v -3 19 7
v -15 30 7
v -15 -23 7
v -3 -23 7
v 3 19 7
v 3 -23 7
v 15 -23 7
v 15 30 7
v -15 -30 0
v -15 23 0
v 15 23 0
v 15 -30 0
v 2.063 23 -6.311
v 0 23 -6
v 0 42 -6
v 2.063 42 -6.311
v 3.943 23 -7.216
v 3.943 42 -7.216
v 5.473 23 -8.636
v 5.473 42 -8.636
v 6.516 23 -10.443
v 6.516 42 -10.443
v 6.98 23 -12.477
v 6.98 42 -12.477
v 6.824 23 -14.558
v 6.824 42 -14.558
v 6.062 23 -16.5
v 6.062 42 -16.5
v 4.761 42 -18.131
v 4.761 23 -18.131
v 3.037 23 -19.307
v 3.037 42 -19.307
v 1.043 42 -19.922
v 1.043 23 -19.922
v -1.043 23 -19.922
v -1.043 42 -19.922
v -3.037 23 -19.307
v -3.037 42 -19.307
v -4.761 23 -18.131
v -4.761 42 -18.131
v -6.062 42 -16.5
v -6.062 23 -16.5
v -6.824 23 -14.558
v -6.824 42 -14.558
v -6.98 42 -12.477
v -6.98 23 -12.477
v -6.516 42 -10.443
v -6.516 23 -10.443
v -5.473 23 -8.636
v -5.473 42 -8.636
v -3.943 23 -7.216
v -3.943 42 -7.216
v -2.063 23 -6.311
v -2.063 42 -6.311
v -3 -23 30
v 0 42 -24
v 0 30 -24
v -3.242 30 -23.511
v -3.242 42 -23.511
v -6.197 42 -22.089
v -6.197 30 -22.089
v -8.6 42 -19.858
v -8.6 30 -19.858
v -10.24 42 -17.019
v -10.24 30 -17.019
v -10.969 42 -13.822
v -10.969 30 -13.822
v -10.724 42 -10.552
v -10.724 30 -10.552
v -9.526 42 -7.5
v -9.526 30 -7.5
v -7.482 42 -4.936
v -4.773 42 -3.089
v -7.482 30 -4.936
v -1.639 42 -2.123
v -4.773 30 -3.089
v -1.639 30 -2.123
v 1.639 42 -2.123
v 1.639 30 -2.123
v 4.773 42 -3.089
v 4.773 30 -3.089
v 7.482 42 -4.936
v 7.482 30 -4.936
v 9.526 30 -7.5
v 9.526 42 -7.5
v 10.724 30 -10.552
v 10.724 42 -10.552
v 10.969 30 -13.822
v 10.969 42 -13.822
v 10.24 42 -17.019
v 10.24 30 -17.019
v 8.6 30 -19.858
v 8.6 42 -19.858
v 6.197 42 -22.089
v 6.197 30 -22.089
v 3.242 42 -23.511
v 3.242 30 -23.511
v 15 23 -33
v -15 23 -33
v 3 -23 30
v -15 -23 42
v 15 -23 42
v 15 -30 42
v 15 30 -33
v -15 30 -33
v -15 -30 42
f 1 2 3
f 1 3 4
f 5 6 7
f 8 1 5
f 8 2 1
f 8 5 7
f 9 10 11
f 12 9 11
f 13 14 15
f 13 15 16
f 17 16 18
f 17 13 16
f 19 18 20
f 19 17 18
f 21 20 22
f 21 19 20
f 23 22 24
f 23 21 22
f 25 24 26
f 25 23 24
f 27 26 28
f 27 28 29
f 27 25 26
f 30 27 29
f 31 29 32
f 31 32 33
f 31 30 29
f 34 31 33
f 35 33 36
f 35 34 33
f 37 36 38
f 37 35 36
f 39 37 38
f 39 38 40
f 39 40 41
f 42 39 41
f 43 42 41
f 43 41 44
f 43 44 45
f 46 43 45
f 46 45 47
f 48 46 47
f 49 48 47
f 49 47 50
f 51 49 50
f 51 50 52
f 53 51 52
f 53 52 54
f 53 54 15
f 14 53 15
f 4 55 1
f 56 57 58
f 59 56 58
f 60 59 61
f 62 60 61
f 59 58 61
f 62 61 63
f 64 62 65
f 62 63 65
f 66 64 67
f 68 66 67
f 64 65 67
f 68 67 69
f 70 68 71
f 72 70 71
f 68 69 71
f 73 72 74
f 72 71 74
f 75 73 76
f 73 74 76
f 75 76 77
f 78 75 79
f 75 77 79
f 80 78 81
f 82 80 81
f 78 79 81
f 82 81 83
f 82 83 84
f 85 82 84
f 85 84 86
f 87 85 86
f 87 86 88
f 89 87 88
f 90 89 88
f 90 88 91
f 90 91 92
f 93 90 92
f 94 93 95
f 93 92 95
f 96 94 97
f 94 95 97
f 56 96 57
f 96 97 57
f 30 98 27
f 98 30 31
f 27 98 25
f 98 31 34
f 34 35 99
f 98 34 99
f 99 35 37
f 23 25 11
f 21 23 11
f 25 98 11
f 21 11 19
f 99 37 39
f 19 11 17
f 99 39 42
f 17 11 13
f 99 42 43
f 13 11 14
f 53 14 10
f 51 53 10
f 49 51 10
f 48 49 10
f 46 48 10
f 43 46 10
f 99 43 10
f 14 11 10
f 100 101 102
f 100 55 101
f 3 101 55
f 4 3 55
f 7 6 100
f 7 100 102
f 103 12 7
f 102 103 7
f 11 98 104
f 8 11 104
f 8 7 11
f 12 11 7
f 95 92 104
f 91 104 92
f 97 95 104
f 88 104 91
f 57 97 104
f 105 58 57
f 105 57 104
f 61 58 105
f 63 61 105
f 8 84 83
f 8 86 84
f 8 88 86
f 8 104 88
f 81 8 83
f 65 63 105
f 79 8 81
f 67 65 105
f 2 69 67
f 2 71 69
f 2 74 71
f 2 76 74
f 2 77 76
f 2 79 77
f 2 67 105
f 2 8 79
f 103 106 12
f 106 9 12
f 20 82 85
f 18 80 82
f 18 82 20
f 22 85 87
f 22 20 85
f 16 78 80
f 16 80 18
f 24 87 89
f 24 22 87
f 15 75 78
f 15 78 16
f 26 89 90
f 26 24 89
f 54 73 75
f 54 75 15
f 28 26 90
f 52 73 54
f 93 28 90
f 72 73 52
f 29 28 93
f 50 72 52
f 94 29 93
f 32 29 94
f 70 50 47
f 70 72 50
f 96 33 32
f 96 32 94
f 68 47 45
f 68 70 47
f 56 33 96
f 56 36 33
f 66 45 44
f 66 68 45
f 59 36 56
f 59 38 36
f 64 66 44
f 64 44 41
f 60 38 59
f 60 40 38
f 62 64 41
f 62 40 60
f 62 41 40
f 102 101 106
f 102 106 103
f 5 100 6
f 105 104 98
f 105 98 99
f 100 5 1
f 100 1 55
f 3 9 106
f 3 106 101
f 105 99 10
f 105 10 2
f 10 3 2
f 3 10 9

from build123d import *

# Parameters (mm, degrees)
SKETCH1_W           = 30
SKETCH1_H           = 60
BOSS_EXTRUDE1_DEPTH = 7
SKETCH2_W           = 30
SKETCH2_H           = 7
BOSS_EXTRUDE2_DEPTH = 35
BOSS_EXTRUDE3_DEPTH = 3
SKETCH4_W           = 30
SKETCH4_H           = 7
BOSS_EXTRUDE4_DEPTH = 33
SKETCH5_R           = 11
SKETCH5_R_2         = 7
BOSS_EXTRUDE5_DEPTH = 12
CUT_EXTRUDE1_START  = -12
SKETCH6_R           = 7
CUT_EXTRUDE1_DEPTH  = 12


with BuildPart() as part:
    # Sketch1 → Boss-Extrude1 (new body)
    with BuildSketch(Plane.XY):
        Rectangle(SKETCH1_W, SKETCH1_H)
    extrude(amount=BOSS_EXTRUDE1_DEPTH)

    # Sketch2 → Boss-Extrude2 (add)
    with BuildSketch(Plane.XY.offset(7)):
        with Locations((0, -26.5)):
            Rectangle(SKETCH2_W, SKETCH2_H)
    extrude(amount=BOSS_EXTRUDE2_DEPTH)

    # Sketch3 → Boss-Extrude3 (add, symmetric)
    with BuildSketch(Plane(origin=(0, 0, 0), x_dir=(0, 0, -1), z_dir=(1, 0, 0))):
        Polygon((-7, -23), (-7, 19), (-30, -23), align=None)
    extrude(amount=BOSS_EXTRUDE3_DEPTH, both=True)

    # Sketch4 → Boss-Extrude4 (add)
    with BuildSketch(Plane(origin=(0, 0, 0), x_dir=(-1, 0, 0), z_dir=(0, 0, -1))):
        with Locations((0, 26.5)):
            Rectangle(SKETCH4_W, SKETCH4_H)
    extrude(amount=BOSS_EXTRUDE4_DEPTH)

    # Sketch5 → Boss-Extrude5 (add)
    with BuildSketch(Plane(origin=(0, 30, 0), x_dir=(1, 0, 0), z_dir=(0, 1, 0))):
        with Locations(Location((0, 13, 0), (0, 0, 90))):
            Circle(SKETCH5_R)
        with Locations(Location((0, 13, 0), (0, 0, 270))):
            Circle(SKETCH5_R_2, mode=Mode.SUBTRACT)
    extrude(amount=BOSS_EXTRUDE5_DEPTH)

    # Sketch6 → Cut-Extrude1 (cut)
    with BuildSketch(Plane(origin=(0, 30, 0), x_dir=(1, 0, 0), z_dir=(0, 1, 0)).offset(CUT_EXTRUDE1_START)):
        with Locations(Location((0, 13, 0), (0, 0, 270))):
            Circle(SKETCH6_R)
    extrude(amount=CUT_EXTRUDE1_DEPTH, mode=Mode.SUBTRACT)


solid = part.part
